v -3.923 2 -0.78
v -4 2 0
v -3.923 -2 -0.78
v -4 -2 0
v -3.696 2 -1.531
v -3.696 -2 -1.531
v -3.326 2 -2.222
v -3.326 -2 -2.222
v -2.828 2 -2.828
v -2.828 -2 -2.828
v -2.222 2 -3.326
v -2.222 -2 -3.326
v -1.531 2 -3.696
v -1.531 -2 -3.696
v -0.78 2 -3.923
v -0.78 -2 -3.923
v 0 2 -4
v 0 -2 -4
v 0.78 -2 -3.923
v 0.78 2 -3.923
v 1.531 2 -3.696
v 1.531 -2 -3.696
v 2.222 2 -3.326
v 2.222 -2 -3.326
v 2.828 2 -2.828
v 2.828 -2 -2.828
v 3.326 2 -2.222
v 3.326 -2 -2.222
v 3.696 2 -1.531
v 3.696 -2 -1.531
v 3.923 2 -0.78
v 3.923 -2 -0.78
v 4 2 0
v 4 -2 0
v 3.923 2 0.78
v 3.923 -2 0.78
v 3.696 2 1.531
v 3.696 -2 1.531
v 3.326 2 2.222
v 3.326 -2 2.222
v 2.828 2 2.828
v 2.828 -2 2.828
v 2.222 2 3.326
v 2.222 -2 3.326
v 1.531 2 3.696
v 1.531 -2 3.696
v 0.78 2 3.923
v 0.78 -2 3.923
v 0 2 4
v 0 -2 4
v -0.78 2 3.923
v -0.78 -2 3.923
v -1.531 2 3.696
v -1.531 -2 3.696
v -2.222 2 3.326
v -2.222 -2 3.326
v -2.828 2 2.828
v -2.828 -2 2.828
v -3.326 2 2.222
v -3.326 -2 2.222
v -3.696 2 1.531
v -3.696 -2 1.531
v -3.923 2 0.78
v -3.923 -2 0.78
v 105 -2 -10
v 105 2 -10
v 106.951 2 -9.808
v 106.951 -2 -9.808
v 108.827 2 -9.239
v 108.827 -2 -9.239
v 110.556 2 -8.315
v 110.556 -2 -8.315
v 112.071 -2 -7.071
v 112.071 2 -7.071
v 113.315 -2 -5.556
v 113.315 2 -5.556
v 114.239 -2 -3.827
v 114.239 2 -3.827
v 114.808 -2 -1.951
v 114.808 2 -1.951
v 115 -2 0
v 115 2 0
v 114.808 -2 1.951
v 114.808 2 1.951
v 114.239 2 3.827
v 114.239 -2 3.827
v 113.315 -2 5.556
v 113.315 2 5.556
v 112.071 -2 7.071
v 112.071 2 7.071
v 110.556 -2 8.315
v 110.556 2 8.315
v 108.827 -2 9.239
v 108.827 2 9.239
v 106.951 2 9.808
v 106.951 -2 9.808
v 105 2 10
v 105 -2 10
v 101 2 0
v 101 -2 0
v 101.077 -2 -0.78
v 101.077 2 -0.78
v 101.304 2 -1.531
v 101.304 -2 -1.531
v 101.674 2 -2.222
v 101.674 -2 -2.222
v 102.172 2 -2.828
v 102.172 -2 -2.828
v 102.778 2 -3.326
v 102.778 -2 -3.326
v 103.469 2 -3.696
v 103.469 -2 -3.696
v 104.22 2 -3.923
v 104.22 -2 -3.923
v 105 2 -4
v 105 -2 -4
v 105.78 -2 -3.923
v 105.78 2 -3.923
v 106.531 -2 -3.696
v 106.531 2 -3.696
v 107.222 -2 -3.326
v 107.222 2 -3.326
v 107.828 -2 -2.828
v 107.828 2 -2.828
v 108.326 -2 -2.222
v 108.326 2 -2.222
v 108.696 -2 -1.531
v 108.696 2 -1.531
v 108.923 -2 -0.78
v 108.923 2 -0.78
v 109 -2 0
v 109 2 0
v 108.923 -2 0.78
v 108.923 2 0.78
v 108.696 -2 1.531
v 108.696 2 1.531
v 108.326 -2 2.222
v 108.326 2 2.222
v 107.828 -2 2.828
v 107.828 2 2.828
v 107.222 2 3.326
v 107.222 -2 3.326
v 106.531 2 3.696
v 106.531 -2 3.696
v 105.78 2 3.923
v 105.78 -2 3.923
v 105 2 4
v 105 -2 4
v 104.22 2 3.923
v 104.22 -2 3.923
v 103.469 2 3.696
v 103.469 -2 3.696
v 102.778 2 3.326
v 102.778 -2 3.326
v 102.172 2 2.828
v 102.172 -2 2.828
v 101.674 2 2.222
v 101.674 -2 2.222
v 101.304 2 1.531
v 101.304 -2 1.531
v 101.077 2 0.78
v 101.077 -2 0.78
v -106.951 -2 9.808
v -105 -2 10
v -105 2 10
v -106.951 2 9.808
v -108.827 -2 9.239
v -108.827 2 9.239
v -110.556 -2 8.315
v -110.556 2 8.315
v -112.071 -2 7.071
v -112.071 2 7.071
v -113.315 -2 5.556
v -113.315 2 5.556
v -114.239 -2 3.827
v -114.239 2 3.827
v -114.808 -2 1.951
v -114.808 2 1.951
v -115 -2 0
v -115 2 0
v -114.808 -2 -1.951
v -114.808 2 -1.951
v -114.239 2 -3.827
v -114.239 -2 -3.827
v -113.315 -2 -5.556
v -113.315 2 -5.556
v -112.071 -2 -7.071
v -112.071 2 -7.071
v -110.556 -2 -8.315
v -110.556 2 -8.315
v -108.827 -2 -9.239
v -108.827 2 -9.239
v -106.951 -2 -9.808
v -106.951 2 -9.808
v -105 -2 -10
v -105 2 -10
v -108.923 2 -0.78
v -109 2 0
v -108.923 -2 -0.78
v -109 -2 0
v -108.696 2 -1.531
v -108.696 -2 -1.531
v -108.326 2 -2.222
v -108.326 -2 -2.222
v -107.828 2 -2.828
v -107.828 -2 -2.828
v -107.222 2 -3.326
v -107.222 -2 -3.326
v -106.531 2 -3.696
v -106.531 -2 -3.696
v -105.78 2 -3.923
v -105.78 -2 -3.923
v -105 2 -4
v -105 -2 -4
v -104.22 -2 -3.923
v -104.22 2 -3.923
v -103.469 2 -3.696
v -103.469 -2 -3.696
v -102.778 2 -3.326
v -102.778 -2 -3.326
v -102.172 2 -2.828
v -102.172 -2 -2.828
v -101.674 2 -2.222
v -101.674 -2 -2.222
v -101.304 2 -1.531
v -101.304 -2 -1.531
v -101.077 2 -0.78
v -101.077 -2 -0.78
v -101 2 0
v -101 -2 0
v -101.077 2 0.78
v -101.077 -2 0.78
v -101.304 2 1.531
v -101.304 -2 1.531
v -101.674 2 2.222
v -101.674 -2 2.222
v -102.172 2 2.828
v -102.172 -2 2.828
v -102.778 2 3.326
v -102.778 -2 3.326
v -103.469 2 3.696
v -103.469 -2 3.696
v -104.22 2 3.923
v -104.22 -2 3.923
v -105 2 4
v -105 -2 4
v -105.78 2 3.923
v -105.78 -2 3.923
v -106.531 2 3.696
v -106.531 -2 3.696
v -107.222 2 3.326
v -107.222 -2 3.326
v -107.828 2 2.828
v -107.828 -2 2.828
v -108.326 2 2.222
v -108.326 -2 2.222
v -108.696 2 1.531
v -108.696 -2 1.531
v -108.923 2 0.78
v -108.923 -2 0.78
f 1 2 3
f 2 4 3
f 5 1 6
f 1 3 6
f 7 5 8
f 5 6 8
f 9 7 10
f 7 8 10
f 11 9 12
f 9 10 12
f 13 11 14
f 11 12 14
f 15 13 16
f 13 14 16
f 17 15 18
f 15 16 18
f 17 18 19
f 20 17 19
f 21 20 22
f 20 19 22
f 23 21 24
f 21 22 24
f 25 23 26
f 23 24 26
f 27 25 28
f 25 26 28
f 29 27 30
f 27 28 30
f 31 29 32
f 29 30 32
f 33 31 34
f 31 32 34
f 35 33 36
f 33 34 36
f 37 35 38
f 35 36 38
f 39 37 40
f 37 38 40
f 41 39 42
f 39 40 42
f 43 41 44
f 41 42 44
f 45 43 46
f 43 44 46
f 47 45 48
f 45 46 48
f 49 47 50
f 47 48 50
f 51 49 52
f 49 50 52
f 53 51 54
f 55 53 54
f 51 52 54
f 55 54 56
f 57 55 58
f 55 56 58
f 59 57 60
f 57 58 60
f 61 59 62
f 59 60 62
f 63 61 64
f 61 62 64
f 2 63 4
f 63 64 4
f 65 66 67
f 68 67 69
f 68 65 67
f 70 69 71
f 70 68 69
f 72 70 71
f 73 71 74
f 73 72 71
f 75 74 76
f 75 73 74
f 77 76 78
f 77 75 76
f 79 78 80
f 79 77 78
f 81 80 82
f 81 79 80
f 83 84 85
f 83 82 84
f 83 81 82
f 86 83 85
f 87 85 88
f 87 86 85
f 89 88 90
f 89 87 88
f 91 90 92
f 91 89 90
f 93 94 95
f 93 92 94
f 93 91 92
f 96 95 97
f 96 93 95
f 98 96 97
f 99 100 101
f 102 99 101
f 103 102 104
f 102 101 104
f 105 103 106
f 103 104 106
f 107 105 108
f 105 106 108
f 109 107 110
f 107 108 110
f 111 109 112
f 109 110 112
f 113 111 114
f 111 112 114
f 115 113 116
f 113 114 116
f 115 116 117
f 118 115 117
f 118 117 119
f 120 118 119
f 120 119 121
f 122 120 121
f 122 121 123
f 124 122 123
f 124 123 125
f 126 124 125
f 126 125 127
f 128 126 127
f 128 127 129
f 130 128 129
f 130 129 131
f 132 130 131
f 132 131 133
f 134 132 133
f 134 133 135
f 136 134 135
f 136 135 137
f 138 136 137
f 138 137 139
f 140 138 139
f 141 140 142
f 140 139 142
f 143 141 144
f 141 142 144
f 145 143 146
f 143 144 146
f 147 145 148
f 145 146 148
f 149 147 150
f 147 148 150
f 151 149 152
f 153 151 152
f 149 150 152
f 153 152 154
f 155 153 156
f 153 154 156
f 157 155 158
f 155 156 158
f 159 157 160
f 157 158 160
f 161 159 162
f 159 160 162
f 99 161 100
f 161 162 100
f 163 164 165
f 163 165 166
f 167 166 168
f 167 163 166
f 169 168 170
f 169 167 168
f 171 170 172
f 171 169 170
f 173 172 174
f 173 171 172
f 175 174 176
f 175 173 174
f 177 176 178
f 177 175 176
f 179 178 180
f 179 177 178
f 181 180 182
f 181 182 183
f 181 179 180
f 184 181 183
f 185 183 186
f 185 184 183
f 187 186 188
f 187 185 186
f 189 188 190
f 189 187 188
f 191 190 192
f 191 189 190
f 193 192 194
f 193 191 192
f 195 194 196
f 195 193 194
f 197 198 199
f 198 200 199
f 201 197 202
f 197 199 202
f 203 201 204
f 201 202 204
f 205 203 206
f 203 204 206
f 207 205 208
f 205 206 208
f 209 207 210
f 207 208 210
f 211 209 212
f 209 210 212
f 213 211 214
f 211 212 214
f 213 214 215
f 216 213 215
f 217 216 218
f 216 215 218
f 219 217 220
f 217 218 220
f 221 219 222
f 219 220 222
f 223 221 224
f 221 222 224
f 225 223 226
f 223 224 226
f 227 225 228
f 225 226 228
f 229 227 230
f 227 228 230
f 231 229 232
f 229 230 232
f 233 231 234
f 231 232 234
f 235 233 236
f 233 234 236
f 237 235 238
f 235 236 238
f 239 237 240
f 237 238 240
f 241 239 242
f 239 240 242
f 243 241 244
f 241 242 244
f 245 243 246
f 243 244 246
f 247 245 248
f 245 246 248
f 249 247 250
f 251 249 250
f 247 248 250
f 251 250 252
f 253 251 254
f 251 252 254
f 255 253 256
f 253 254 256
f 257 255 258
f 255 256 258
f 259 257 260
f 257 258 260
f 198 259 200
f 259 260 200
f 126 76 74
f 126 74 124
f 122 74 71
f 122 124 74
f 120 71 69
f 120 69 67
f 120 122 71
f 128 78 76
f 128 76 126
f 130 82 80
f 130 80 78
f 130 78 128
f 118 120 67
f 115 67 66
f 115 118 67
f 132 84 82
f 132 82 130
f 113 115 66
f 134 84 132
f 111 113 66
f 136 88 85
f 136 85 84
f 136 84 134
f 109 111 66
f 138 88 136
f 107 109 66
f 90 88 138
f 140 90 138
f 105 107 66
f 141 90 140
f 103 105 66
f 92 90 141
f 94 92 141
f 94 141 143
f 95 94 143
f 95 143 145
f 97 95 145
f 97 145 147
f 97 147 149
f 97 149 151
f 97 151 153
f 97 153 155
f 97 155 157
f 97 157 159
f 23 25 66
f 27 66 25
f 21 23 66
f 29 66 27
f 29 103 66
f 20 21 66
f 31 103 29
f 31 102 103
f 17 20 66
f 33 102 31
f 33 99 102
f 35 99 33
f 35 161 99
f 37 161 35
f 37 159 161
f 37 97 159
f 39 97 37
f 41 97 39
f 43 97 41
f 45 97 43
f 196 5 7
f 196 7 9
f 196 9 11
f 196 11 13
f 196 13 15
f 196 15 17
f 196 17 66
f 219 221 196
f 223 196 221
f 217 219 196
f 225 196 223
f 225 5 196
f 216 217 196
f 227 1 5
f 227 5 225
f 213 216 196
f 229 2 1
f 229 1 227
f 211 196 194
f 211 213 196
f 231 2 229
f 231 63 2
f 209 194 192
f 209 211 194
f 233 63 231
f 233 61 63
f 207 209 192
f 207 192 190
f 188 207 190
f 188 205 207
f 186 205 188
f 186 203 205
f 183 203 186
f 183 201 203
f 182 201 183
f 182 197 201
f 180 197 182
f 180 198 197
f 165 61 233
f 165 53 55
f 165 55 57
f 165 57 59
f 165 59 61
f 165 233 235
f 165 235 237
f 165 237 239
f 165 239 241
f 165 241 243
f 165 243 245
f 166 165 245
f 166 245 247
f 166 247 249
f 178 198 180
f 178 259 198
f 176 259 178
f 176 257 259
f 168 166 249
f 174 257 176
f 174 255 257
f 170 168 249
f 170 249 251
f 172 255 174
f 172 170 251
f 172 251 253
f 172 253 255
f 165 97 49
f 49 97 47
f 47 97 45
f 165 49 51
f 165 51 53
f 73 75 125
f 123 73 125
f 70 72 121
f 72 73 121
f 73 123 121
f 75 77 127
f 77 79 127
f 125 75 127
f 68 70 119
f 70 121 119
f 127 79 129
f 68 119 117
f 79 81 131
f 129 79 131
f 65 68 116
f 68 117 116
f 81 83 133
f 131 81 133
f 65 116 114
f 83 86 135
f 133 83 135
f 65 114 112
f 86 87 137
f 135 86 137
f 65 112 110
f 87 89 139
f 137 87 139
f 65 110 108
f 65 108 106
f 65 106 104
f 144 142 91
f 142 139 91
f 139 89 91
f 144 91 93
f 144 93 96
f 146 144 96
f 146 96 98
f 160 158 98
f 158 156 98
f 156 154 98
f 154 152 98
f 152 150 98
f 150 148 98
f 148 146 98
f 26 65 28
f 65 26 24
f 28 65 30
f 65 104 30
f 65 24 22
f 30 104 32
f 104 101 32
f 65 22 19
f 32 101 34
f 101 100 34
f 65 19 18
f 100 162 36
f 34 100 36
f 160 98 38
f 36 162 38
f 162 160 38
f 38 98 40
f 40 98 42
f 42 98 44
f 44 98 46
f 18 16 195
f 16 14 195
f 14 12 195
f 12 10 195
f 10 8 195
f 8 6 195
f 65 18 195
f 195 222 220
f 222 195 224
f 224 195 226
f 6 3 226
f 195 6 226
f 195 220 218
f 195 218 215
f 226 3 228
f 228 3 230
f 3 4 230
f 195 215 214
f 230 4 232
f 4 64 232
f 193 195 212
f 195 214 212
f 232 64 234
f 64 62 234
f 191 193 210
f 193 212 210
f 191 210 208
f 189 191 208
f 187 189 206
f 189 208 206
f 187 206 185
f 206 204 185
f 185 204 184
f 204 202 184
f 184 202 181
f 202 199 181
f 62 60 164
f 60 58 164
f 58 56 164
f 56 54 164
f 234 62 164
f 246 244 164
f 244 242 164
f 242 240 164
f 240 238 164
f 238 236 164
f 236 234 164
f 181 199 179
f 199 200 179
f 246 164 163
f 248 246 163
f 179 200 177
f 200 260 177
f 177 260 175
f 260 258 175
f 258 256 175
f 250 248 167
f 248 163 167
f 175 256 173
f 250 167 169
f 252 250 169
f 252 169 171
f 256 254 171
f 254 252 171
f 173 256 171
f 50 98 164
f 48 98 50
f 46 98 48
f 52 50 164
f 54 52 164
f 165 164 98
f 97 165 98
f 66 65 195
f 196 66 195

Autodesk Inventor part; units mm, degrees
sketch "Эскиз1" plane through (0, 0, 0) normal (0, 1, 0) x (-1, 0, 0)
  line L0 (105, 10) -> (-105, 10)
  line L1 (-105, -10) -> (105, -10)
  line L2 (105, 10) -> (-105, -10) construction
  line L3 (-105, 10) -> (105, -10) construction
  arc A0 (-105, 10) -> (-105, -10) centre (-105, 0) ccw
  arc A1 (105, -10) -> (105, 10) centre (105, 0) ccw
  line L4 (0, -14) -> (0, 14) construction
  circle A2 centre (105, 0) radius 4
  circle A3 centre (-105, 0) radius 4
  circle A4 centre (0, 0) radius 4
  line L5 (-161, 0) -> (161, 0) projected
  point P0 (0, 10)
  point P1 (0, -10)
  dimension "d2" = 210
  dimension "d5" = 8
  dimension "d6" = 8
  dimension "d9" = 8
  dimension "d17" = 10
extrude "Выдавливание1" add sketch "Эскиз1" along normal mid plane 4 contours A1 L5 A2 A4 A3 A0 L0 | A1 L1 A0 L5 A3 A4 A2
properties part number "Рельс платформы подъёмника"
